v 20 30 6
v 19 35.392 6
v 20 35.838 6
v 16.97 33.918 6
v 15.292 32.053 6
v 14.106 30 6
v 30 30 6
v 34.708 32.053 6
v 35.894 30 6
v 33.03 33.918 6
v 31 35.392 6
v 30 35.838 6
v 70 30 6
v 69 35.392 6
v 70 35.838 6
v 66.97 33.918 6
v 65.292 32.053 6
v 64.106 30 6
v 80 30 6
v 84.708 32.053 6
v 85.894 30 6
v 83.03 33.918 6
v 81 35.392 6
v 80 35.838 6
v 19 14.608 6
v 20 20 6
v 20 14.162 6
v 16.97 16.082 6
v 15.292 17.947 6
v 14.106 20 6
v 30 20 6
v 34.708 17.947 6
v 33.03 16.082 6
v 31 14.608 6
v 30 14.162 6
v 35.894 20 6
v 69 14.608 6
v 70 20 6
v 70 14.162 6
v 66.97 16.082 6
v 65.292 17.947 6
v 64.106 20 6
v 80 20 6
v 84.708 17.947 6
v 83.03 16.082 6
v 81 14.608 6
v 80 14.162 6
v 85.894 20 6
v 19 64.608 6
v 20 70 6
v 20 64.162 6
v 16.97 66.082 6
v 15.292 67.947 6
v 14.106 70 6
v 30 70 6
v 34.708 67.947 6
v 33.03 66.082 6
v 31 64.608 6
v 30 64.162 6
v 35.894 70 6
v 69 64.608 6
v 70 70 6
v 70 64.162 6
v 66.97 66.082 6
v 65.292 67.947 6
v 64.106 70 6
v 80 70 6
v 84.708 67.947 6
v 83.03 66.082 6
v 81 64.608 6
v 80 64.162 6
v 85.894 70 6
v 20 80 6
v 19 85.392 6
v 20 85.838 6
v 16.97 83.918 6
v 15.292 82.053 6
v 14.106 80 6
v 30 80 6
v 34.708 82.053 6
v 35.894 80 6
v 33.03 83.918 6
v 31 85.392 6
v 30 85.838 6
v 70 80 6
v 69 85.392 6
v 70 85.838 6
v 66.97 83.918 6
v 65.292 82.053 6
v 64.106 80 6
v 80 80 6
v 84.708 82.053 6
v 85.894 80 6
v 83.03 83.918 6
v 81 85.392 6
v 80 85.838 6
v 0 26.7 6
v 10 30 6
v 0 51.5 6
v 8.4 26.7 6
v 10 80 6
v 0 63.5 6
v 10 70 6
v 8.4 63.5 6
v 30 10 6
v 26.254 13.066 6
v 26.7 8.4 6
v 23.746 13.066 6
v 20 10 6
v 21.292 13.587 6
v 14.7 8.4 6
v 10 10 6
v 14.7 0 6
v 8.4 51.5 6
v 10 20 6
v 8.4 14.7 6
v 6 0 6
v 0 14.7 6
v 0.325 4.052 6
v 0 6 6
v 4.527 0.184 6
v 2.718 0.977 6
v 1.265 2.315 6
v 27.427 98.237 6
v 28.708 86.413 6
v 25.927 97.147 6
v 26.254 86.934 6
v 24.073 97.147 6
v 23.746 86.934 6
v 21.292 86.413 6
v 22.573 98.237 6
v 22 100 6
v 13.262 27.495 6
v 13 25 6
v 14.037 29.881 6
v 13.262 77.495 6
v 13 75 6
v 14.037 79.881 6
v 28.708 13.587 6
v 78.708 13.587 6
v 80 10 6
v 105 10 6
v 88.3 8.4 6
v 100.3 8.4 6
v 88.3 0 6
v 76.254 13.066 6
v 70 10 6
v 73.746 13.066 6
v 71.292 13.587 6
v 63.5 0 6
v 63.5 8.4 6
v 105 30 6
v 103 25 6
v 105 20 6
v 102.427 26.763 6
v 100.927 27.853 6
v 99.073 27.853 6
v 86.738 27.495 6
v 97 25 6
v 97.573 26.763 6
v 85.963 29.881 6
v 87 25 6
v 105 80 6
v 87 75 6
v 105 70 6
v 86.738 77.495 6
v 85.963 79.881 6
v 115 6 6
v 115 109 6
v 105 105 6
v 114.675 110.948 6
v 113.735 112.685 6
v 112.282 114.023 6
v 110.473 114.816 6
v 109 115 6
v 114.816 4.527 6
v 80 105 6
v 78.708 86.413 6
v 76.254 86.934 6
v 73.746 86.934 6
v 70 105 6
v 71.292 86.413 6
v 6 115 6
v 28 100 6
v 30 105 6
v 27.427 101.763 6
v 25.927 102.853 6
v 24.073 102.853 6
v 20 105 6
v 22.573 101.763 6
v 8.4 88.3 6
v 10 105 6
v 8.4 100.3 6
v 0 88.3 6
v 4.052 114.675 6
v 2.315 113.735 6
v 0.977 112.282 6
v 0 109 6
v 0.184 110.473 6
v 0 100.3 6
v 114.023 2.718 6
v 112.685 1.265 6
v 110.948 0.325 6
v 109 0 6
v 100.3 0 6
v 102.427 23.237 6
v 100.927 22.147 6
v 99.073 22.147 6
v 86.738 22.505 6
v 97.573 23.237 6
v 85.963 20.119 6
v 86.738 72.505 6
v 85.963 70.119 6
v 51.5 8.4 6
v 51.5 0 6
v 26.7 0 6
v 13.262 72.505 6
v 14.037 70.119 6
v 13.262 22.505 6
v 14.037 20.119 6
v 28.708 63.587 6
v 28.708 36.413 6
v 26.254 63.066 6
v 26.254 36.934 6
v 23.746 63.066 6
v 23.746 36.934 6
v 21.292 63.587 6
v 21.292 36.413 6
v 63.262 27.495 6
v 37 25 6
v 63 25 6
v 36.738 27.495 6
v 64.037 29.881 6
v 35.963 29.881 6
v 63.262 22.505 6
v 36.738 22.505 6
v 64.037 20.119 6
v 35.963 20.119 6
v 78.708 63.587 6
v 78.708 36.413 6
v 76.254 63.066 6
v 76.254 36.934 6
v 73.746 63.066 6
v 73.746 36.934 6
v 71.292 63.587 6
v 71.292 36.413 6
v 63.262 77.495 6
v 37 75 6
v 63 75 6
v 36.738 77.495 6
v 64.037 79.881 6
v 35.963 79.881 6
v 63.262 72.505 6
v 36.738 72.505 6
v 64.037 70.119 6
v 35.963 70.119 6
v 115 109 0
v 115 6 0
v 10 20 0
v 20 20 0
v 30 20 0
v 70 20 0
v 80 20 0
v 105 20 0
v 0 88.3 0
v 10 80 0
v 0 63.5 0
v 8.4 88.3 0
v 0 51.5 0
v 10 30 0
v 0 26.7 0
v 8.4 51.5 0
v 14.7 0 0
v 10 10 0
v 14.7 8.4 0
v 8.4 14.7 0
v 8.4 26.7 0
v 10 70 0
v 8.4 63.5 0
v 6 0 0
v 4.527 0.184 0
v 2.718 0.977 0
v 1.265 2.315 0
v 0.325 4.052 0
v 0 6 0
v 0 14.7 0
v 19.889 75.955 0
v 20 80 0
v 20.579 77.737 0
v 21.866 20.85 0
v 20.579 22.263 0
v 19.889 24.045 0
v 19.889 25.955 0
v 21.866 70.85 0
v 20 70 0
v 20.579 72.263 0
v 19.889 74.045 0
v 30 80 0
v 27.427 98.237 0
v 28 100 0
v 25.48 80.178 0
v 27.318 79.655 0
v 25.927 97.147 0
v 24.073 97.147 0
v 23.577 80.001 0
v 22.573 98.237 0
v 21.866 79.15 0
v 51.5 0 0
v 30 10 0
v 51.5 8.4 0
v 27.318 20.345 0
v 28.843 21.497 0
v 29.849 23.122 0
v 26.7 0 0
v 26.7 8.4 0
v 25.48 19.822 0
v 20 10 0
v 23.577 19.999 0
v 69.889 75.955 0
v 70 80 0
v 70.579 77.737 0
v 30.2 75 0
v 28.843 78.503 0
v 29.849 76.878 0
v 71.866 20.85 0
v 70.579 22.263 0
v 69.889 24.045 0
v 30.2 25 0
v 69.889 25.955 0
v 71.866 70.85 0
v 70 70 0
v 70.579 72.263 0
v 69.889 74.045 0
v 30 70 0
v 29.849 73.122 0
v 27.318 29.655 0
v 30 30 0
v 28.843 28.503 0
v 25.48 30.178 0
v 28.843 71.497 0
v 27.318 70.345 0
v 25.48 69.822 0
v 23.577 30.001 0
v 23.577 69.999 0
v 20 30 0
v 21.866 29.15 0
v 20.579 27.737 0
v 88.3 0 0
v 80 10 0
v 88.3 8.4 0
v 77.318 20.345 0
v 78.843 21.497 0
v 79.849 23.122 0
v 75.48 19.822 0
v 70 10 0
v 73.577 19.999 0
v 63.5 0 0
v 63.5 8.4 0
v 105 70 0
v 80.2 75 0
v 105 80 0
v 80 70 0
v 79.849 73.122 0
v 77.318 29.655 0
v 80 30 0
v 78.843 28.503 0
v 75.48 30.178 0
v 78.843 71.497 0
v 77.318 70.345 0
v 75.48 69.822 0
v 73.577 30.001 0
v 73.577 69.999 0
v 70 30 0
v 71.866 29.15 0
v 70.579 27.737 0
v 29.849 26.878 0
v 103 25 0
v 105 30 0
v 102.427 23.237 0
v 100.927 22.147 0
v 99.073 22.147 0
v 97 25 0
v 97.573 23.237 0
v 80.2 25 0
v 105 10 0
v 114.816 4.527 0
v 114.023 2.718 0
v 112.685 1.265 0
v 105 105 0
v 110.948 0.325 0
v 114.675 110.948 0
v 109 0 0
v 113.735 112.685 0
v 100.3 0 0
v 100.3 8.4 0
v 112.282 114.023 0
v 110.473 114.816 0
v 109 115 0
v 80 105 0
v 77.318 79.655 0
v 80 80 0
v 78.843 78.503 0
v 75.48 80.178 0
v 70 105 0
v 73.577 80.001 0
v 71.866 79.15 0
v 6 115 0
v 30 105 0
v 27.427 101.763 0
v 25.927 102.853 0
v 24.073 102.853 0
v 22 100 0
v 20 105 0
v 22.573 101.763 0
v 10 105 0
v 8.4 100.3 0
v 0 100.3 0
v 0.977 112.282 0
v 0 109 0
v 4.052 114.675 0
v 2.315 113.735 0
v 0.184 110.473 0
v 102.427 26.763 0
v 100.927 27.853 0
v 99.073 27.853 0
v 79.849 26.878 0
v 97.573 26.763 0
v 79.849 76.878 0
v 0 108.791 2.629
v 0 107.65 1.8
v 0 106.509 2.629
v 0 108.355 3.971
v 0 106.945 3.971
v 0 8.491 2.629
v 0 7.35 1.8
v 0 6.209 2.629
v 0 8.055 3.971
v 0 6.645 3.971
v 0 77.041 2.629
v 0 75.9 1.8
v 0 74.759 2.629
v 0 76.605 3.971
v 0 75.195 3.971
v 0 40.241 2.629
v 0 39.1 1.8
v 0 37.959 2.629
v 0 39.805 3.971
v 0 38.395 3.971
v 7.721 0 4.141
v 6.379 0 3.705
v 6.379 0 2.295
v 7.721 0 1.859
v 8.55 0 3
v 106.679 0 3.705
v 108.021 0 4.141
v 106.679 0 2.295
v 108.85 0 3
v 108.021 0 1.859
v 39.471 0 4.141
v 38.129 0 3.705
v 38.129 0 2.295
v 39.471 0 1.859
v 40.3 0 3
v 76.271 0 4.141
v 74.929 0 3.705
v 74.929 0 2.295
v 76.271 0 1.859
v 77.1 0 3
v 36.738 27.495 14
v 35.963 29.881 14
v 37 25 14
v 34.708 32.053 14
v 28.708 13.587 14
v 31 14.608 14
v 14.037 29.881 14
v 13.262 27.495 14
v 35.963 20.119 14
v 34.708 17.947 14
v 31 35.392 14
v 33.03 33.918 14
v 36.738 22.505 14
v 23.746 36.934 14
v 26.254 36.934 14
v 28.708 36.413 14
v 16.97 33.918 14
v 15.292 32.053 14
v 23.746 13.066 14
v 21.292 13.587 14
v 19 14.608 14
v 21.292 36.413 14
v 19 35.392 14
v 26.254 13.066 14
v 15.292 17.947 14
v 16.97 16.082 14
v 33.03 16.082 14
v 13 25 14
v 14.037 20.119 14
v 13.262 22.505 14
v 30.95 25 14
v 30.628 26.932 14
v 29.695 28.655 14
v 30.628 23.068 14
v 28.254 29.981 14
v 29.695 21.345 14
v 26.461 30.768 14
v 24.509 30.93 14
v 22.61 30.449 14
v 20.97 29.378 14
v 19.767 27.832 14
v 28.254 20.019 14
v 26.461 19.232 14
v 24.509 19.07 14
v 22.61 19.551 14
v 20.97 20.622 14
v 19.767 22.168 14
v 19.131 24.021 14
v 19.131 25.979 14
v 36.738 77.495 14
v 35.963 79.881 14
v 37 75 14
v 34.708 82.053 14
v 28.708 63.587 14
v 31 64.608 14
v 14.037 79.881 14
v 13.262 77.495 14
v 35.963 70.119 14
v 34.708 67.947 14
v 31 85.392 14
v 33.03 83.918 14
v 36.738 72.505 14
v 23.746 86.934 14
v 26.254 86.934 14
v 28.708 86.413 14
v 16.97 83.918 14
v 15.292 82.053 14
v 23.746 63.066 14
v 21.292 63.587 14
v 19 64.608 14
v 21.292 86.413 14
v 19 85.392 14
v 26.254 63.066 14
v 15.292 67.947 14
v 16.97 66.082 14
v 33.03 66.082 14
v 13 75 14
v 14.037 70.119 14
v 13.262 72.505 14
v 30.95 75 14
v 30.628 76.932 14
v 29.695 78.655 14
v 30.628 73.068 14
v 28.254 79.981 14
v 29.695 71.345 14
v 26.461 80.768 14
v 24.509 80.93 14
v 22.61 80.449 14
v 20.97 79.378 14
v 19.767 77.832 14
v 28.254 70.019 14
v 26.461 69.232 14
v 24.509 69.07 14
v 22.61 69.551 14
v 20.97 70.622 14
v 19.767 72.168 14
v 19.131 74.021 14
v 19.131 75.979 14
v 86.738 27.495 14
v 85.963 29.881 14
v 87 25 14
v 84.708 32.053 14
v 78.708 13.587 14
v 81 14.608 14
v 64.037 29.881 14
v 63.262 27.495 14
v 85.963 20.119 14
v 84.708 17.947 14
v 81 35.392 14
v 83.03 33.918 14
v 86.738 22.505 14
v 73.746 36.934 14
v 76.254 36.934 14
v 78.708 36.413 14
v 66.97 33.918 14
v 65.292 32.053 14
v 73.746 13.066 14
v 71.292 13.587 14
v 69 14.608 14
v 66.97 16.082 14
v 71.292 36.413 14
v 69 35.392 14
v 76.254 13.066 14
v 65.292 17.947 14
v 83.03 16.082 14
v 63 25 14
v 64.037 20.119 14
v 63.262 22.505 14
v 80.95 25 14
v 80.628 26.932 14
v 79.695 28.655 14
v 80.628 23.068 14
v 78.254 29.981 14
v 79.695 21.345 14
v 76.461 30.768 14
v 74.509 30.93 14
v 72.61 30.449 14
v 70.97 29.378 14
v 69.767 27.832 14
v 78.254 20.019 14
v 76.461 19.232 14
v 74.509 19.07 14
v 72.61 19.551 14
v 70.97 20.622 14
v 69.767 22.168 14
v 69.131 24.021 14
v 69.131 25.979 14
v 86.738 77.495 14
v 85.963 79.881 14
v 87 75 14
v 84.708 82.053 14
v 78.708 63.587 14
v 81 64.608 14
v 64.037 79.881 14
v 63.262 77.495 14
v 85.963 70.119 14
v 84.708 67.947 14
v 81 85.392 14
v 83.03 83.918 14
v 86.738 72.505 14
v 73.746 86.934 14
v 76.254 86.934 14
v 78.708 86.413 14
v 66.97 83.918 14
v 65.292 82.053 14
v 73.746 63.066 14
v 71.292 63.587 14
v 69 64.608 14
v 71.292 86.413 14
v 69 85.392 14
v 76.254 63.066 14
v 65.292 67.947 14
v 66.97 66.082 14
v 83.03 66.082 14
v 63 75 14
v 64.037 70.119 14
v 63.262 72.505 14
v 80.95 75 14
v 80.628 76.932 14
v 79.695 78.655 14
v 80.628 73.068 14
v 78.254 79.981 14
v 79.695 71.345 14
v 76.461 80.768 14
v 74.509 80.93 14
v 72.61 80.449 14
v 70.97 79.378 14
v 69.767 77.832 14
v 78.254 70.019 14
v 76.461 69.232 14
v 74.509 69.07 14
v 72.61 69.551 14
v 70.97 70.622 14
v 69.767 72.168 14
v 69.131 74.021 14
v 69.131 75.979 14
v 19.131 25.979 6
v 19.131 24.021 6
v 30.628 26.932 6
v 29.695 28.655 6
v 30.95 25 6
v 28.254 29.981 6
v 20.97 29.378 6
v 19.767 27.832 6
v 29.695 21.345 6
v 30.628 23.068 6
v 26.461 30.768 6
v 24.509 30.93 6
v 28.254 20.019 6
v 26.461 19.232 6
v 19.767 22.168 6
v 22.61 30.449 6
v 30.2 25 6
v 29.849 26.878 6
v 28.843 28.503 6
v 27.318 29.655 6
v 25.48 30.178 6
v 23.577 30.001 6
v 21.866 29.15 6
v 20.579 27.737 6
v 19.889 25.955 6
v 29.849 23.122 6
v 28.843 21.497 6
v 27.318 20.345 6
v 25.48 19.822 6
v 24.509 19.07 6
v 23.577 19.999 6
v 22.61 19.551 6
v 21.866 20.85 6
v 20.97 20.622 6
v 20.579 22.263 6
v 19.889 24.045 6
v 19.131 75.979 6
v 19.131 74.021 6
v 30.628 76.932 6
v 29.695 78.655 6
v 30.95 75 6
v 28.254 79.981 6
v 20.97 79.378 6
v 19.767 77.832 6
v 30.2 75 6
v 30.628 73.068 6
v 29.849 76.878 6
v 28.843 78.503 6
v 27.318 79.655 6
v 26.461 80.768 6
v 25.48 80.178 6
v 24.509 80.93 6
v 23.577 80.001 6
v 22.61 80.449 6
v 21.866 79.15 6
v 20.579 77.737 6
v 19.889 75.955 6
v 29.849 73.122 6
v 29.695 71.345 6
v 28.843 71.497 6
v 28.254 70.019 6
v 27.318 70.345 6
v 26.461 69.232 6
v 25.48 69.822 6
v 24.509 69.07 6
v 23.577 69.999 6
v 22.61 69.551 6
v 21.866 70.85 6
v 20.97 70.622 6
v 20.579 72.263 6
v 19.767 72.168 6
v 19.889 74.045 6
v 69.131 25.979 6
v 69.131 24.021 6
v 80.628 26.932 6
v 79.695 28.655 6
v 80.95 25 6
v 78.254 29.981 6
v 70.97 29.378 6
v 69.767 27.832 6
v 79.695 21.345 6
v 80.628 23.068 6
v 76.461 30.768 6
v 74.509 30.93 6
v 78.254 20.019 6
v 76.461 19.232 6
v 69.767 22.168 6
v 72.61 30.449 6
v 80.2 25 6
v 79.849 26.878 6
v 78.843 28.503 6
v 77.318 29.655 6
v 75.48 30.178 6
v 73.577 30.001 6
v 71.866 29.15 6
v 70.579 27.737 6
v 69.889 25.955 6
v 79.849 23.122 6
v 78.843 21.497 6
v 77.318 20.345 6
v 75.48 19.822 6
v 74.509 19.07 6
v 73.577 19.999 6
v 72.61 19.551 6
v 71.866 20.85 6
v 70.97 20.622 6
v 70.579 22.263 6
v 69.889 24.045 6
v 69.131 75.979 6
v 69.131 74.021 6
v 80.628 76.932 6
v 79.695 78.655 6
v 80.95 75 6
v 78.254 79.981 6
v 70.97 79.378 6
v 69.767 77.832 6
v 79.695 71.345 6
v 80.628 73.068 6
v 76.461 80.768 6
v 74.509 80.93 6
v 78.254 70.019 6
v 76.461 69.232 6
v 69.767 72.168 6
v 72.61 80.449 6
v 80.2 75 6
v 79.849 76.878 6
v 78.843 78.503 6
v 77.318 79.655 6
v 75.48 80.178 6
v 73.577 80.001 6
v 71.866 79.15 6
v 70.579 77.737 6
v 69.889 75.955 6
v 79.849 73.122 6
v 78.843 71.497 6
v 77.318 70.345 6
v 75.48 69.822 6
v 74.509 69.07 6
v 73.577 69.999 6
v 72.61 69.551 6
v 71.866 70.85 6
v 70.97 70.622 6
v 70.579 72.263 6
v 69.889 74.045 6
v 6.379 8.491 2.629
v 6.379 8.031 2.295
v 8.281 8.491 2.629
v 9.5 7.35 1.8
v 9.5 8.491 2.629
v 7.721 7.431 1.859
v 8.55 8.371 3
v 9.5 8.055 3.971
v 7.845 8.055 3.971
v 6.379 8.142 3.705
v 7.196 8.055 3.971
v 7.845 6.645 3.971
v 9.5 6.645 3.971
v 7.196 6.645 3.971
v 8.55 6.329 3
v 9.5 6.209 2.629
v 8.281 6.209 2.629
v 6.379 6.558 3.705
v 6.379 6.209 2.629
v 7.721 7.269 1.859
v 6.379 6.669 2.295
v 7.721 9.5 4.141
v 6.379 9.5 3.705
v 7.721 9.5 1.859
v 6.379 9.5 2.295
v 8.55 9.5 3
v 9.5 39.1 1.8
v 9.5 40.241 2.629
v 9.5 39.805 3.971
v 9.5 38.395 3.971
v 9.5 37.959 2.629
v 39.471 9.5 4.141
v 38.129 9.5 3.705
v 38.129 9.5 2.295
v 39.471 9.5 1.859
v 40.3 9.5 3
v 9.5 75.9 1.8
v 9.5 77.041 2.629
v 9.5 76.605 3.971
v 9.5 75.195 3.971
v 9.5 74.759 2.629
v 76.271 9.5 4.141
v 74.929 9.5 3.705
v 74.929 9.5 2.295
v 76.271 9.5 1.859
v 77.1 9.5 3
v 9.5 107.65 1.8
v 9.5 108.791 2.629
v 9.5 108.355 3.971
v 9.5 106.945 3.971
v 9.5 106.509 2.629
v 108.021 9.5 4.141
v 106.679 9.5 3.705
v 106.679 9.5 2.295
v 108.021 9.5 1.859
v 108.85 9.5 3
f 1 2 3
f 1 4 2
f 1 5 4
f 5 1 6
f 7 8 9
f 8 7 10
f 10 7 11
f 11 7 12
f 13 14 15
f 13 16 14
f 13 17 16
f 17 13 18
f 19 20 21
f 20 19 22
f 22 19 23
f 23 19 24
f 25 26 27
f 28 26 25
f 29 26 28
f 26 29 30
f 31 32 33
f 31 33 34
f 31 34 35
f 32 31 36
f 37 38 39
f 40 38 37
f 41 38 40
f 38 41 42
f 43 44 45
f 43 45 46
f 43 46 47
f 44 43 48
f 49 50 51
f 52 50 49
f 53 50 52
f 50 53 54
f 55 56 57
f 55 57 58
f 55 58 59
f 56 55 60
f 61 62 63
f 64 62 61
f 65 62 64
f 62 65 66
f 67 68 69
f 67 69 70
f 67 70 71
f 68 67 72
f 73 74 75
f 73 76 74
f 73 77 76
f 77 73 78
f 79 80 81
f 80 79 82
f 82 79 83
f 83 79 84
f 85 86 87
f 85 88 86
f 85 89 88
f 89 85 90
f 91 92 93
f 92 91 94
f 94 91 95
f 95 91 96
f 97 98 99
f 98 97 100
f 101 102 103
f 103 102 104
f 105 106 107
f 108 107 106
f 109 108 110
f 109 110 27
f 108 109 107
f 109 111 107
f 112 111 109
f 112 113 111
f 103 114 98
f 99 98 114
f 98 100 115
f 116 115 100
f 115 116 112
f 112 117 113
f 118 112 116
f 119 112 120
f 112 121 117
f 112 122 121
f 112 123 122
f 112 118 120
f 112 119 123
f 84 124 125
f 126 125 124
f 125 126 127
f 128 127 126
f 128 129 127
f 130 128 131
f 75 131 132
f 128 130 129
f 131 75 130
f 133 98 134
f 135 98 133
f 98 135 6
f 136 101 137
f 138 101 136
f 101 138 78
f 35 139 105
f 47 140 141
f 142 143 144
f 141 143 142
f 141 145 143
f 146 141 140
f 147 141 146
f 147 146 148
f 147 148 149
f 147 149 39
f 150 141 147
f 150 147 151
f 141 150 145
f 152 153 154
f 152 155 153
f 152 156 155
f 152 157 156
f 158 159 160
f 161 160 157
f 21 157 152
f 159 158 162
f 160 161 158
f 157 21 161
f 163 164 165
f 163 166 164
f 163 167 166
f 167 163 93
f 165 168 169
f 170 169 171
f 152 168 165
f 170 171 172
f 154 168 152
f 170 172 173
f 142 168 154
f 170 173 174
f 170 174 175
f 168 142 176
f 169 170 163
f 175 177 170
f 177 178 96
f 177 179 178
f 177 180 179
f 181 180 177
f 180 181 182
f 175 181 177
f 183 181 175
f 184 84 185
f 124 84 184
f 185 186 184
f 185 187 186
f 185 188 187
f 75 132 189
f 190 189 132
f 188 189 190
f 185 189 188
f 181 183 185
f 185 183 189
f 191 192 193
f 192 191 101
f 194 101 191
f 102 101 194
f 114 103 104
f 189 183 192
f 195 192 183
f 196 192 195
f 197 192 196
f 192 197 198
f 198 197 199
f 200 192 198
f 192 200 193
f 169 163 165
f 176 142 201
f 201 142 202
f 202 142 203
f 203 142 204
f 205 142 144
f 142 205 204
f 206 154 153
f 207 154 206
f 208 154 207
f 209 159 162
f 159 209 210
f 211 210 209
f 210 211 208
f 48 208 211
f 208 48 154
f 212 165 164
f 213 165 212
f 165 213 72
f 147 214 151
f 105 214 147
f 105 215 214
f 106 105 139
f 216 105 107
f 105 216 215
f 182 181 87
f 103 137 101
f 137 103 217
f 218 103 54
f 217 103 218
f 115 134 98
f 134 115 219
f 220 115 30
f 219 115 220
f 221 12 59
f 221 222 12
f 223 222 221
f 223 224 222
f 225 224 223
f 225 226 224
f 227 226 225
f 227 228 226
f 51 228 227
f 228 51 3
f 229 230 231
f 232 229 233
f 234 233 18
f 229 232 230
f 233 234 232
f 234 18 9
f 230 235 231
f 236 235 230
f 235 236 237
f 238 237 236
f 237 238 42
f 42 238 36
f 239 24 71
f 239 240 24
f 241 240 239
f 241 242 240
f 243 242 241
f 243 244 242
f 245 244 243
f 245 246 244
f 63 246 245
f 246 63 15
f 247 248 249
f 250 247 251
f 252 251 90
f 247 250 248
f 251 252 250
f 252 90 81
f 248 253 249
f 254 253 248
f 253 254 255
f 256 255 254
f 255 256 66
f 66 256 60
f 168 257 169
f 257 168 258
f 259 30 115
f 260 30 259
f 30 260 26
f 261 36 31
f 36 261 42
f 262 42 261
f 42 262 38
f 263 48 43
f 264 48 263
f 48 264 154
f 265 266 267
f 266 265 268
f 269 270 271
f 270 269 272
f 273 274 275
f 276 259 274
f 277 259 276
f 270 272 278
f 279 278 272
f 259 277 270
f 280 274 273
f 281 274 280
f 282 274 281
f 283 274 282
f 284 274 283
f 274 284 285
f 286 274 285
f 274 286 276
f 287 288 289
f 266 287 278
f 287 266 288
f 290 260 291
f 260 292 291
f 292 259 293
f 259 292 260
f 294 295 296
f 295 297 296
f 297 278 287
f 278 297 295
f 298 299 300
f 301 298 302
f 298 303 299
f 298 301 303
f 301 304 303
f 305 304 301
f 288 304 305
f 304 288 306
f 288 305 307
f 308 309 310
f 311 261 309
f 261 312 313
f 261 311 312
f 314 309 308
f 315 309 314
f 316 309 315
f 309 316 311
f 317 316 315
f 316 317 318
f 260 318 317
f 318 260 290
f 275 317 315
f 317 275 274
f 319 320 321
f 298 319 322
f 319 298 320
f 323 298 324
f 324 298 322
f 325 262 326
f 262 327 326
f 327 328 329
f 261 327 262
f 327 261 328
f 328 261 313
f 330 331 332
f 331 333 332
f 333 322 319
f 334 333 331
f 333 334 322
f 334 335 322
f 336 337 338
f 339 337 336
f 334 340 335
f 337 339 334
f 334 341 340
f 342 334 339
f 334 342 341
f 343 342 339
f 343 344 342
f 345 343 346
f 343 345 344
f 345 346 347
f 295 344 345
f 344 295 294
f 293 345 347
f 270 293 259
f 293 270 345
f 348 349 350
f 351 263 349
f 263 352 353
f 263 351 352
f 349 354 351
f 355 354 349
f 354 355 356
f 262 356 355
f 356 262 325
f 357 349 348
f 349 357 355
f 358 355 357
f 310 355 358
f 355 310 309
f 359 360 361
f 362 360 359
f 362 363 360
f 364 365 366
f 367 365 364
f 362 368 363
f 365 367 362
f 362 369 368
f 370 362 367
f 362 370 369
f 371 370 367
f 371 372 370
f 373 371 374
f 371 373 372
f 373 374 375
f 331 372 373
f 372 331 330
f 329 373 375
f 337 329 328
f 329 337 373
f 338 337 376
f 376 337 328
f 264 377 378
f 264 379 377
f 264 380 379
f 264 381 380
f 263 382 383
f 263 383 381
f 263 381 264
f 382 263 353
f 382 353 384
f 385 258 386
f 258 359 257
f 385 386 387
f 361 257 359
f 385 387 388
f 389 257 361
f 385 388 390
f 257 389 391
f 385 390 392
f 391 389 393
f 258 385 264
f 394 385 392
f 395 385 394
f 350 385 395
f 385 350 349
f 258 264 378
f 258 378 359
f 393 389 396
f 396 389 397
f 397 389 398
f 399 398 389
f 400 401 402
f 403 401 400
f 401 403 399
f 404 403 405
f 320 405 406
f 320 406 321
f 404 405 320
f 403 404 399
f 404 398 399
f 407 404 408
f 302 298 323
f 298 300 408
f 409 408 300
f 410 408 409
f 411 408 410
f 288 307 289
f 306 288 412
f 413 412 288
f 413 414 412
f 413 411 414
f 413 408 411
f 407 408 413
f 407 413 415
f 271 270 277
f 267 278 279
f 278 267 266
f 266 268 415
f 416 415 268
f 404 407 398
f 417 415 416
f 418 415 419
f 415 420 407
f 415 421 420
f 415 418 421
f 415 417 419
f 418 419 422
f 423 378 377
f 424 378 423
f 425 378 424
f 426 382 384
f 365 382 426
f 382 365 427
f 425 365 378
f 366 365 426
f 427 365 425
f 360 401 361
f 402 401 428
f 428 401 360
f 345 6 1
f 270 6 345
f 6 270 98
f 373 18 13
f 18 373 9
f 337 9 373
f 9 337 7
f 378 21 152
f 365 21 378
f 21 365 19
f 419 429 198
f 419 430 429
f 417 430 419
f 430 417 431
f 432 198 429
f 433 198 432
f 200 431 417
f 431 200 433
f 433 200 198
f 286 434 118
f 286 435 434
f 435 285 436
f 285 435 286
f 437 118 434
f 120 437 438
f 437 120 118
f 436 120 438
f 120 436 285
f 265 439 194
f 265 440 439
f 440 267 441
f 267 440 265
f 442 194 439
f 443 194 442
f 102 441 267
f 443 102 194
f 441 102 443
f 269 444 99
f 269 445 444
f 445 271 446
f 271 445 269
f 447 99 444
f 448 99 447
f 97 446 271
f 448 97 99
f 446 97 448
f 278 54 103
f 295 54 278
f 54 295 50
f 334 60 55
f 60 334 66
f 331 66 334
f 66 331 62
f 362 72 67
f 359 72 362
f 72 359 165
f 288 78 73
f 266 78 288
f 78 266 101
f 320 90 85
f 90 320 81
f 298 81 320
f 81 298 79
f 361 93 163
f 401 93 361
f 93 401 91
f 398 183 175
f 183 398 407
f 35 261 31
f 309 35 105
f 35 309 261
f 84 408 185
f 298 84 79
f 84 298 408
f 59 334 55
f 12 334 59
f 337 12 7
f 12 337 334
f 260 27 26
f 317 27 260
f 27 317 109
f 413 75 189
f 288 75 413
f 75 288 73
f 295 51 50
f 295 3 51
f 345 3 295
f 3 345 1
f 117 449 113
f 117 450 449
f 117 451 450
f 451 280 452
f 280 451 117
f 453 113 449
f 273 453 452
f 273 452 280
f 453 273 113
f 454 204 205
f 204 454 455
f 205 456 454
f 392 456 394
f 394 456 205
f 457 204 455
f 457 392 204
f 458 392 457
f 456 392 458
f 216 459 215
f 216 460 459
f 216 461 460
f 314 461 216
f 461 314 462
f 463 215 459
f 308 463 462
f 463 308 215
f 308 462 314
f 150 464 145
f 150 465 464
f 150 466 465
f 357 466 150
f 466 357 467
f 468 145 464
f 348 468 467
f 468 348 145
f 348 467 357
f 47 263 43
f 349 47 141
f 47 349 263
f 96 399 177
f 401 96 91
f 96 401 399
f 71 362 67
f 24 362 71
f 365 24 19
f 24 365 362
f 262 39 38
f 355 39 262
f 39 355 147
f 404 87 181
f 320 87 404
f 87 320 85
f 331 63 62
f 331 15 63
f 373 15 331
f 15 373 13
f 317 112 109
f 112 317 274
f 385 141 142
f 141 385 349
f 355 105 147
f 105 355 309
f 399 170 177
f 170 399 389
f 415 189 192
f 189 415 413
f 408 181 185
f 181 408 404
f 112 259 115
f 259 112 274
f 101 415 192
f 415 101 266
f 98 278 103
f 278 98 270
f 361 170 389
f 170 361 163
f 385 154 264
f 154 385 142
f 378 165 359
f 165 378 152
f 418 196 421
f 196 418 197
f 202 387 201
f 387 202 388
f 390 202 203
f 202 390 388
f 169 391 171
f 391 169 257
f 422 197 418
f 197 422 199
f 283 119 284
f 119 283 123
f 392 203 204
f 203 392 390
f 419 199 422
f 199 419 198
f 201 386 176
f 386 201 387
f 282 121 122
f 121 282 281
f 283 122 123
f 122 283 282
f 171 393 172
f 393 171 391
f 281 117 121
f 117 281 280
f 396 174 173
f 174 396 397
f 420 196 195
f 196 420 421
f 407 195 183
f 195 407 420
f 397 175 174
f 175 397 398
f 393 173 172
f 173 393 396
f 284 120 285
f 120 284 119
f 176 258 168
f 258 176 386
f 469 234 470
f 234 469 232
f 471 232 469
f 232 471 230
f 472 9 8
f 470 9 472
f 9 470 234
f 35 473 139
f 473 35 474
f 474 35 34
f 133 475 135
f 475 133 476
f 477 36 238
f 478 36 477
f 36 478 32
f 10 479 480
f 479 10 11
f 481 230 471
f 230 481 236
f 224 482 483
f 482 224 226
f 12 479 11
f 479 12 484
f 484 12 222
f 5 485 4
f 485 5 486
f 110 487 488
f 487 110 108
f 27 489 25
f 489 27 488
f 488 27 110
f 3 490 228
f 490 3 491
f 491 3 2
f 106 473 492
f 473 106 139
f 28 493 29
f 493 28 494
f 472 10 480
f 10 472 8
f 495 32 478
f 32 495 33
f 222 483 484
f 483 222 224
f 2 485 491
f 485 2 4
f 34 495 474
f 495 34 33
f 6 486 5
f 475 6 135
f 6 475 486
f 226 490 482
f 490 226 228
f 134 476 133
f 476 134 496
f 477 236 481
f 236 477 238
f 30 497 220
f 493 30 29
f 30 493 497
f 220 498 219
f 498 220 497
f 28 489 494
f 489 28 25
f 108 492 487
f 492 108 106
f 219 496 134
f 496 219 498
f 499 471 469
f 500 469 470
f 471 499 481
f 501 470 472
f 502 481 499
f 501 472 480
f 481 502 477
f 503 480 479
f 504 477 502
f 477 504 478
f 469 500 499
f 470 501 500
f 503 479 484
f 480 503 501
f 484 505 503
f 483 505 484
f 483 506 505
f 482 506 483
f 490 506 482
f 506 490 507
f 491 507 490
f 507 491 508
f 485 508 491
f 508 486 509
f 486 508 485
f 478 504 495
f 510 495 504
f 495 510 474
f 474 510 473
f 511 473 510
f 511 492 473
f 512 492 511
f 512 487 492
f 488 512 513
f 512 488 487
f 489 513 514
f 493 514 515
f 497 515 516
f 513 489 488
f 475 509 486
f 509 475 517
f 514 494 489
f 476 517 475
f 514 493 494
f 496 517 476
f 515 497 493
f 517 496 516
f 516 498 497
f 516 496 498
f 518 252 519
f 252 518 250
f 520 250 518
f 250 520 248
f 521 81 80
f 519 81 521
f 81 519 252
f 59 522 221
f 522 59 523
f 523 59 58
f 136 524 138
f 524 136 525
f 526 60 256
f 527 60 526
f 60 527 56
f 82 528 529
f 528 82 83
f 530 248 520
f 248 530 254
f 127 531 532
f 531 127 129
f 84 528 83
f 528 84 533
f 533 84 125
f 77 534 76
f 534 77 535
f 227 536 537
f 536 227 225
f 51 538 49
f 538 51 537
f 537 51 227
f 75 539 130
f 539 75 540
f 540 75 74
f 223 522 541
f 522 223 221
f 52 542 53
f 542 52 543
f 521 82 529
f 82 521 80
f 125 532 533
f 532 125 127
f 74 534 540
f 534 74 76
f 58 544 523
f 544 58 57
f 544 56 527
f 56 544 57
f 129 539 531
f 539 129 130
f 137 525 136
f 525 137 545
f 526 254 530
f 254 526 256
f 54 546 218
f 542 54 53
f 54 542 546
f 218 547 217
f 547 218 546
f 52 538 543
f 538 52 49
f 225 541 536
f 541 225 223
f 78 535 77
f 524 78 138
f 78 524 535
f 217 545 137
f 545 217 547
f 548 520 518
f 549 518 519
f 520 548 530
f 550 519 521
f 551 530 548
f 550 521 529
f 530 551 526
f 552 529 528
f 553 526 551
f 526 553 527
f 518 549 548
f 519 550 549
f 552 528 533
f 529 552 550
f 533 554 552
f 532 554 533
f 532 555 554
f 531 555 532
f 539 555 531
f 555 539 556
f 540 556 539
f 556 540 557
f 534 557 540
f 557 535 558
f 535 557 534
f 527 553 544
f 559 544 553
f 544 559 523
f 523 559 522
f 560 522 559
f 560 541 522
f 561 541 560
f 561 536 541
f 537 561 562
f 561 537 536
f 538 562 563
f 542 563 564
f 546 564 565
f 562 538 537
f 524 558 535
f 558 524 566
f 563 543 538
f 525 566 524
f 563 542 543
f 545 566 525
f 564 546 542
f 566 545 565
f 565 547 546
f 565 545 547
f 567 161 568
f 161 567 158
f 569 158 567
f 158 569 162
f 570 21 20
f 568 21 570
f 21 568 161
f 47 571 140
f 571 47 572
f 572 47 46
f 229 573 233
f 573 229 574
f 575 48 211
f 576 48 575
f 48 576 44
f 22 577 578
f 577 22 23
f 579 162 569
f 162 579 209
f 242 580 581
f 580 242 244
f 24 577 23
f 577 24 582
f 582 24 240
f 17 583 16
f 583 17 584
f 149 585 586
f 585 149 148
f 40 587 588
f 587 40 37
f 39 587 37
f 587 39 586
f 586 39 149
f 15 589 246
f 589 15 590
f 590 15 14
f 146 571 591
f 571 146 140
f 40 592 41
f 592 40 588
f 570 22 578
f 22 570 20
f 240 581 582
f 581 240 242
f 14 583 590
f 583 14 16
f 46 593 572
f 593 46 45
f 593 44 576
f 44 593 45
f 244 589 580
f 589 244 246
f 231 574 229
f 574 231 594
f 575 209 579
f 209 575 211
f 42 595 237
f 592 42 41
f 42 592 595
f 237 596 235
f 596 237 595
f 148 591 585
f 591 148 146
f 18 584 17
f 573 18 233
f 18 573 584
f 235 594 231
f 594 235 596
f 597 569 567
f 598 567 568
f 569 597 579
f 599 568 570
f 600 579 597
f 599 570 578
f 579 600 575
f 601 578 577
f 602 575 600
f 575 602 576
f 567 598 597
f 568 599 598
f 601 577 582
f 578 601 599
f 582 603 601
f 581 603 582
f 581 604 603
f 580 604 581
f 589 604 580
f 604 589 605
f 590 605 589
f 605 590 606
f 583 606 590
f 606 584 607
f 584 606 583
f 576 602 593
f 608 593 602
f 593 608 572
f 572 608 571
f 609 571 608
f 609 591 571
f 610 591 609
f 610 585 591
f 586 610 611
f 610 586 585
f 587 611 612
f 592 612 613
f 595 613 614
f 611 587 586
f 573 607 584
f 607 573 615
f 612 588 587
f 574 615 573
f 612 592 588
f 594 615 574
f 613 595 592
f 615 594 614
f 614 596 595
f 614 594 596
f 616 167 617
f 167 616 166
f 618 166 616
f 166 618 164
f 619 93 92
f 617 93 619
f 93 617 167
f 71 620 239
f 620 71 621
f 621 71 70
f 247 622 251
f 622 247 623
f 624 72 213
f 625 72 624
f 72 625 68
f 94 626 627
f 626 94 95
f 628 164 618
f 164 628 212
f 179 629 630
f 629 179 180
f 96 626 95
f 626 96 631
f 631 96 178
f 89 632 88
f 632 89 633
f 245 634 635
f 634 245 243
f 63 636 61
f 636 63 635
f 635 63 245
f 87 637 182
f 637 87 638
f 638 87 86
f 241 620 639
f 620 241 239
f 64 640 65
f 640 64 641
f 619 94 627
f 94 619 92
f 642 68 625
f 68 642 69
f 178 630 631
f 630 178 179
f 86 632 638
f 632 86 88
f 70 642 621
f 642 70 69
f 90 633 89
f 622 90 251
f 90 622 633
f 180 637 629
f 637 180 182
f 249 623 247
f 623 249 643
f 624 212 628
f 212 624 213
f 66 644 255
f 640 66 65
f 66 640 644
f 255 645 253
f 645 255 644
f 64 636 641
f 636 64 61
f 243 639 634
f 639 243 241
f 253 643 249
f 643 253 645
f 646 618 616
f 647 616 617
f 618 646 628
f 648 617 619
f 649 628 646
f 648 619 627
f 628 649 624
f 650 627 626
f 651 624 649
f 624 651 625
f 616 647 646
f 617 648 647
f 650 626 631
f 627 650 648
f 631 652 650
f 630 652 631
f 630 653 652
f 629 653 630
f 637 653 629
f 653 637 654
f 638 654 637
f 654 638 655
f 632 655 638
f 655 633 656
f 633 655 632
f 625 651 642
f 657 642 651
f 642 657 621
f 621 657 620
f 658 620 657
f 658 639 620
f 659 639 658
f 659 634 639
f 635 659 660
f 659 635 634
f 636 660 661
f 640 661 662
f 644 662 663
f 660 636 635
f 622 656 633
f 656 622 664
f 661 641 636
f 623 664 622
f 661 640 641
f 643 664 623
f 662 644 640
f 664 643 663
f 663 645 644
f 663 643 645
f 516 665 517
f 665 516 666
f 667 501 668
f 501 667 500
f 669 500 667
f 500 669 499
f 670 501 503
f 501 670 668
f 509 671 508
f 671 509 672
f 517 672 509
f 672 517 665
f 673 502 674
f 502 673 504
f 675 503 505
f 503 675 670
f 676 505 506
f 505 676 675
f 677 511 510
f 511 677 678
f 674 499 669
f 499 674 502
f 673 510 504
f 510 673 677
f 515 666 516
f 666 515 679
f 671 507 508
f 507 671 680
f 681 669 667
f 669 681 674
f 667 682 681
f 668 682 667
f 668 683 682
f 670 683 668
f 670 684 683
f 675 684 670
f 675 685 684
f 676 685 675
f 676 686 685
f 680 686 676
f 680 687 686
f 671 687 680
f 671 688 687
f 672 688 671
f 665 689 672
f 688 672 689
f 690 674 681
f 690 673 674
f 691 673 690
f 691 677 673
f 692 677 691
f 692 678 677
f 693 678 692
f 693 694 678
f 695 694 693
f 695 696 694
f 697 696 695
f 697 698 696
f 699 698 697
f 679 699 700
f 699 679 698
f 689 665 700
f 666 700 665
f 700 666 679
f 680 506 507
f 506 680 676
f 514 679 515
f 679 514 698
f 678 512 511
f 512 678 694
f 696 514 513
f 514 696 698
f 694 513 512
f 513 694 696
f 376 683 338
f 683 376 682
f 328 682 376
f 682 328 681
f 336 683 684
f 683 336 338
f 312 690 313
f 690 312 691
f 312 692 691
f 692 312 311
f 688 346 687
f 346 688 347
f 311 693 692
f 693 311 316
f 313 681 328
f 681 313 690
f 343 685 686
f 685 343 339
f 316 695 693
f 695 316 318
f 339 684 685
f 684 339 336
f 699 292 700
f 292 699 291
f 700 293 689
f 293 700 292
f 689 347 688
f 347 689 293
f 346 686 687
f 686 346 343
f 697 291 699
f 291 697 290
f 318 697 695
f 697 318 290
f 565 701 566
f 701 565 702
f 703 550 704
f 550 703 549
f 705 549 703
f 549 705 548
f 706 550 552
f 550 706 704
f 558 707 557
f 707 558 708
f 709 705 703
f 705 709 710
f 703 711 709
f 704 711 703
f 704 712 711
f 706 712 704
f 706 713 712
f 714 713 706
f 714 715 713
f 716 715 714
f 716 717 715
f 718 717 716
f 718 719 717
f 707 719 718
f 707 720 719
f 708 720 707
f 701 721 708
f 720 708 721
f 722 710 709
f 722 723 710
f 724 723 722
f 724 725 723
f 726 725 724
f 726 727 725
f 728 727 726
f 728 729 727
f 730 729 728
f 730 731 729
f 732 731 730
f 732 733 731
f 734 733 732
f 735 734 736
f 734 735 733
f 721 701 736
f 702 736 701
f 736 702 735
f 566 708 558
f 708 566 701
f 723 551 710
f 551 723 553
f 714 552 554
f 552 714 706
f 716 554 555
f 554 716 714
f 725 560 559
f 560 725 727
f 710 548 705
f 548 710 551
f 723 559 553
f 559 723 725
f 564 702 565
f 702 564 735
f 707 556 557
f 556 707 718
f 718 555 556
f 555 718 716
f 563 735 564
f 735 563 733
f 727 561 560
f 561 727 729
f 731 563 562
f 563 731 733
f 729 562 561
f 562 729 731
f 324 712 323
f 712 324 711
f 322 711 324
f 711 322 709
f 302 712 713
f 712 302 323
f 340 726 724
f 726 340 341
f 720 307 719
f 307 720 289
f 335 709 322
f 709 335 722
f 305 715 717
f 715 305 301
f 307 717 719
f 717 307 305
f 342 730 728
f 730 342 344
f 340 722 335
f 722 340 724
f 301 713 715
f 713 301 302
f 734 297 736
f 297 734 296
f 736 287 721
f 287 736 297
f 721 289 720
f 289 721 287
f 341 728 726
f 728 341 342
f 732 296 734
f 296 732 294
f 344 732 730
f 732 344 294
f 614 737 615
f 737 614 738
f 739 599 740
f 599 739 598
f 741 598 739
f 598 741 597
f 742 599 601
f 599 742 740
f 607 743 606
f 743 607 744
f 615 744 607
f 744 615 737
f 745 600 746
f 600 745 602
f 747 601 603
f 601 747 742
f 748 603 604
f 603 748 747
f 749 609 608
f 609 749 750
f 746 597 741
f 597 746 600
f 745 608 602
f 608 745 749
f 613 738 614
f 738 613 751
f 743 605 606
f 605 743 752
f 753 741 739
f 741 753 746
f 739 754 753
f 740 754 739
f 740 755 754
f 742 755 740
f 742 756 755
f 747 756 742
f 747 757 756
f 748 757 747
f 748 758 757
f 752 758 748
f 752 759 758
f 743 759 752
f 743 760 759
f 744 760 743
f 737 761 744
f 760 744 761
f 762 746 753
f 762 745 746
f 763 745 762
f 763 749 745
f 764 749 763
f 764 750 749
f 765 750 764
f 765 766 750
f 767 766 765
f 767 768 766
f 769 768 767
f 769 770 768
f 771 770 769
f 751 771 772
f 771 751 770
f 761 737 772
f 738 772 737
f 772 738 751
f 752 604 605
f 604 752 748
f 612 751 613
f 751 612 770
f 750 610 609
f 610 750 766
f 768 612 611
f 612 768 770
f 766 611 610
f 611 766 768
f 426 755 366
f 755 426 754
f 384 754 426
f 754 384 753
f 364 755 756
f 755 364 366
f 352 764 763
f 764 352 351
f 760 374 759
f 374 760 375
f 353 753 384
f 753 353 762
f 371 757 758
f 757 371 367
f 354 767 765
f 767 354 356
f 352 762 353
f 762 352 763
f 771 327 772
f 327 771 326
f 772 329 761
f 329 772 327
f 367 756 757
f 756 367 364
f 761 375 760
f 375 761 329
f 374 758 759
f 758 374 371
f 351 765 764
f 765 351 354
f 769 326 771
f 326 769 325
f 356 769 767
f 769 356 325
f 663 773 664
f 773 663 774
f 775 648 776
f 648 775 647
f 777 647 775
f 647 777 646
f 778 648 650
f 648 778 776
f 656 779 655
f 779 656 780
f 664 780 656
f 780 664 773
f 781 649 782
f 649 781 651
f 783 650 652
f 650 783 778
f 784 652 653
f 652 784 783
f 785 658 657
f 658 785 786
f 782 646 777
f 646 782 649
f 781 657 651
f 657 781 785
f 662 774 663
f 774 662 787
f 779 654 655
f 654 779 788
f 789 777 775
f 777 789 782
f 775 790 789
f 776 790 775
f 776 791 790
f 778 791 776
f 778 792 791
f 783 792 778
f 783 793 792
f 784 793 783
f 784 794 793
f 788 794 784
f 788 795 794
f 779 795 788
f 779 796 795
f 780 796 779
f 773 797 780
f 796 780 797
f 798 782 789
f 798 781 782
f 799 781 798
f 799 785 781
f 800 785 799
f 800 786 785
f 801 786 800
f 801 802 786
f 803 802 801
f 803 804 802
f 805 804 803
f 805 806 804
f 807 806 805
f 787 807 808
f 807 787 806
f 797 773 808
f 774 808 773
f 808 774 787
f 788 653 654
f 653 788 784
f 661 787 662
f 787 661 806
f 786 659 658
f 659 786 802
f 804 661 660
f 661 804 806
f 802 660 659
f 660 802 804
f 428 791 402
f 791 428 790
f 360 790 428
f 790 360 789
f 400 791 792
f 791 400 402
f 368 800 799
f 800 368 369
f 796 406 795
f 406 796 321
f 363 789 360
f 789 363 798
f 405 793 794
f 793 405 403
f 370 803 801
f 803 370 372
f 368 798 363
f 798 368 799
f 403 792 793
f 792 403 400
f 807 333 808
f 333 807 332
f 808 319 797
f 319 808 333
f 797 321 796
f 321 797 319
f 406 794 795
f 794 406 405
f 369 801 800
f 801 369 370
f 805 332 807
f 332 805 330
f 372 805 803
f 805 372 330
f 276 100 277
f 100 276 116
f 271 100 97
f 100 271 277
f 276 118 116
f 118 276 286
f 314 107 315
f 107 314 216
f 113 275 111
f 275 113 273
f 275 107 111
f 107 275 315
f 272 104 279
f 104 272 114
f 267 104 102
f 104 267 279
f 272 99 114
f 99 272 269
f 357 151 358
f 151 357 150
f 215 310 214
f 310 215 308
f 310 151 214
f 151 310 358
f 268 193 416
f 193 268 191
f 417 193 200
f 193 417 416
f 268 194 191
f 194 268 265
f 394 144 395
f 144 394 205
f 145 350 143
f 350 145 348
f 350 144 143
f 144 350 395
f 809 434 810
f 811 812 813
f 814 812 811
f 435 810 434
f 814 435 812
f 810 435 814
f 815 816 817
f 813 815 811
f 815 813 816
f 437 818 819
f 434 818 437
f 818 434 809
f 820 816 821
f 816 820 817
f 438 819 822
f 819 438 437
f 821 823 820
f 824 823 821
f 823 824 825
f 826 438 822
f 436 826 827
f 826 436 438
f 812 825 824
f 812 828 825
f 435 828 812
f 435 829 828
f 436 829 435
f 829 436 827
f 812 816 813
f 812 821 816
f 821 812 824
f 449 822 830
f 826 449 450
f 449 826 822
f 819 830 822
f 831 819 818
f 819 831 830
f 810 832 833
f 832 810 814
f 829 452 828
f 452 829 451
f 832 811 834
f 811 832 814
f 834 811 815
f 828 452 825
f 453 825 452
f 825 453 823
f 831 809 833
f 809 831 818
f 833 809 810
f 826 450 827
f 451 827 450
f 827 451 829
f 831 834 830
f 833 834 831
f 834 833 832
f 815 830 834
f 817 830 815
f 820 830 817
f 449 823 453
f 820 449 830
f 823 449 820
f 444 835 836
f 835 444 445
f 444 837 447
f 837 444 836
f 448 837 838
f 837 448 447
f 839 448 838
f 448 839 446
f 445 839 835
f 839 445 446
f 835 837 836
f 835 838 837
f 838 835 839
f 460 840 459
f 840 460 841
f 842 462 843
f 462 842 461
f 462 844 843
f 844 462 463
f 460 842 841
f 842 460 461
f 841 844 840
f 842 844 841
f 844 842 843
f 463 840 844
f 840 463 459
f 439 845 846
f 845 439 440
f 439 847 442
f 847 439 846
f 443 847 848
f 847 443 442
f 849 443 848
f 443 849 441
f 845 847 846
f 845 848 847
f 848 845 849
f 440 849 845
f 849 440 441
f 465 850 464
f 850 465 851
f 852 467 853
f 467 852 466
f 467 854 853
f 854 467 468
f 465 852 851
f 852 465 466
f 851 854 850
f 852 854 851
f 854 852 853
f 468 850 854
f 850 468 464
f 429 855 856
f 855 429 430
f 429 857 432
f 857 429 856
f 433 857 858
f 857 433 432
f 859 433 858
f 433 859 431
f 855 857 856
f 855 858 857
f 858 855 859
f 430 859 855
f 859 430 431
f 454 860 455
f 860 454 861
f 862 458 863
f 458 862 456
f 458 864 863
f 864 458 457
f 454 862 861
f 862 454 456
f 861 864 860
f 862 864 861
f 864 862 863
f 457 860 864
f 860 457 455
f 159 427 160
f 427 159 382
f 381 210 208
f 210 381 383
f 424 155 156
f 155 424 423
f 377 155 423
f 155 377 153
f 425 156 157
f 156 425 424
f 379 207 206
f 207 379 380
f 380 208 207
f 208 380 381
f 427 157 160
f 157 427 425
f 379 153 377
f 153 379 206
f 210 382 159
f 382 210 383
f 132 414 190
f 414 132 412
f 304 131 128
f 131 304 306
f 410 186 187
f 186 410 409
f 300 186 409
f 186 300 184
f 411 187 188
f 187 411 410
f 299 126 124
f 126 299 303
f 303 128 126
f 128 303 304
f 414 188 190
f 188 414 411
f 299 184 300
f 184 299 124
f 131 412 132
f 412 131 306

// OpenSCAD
// file: frame.scad
// ============================================================================
//  RIBBED FRAME HELPER — replaces a solid plate with border + grid ribs.
//  Same stiffness where it matters (bosses clamped flat), ~half the plastic.
// ============================================================================

rib_w    = 10;   // [mm] grid rib width
border_w = 10;   // [mm] perimeter border width

// Plan-view rounded rectangle prism — trims vertical edges to radius r.
// Inset polygon + offset(r) keeps the flat edges on x0/x1/y0/y1.
module rounded_outline(x0, y0, x1, y1, h, r = corner_r) {
    translate([0, 0, -0.05])
        linear_extrude(h + 0.1)
            offset(r = r)
                polygon([[x0 + r, y0 + r],
                         [x1 - r, y0 + r],
                         [x1 - r, y1 - r],
                         [x0 + r, y1 - r]]);
}

// Rounded box helper for external edges. Keep radii small to preserve fits.
module rounded_box(size, r = edge_break) {
    // 2D rounded footprint extruded to preserve exact outer dimensions.
    translate([0,0,-size[2]/2]) linear_extrude(size[2])
        offset(r=r) square([size[0]-2*r,size[1]-2*r],center=true);
}

// x0,y0,x1,y1 = plate extent; xs/ys = station coordinates the ribs run through
module rib_plate(x0, y0, x1, y1, xs, ys) {
    intersection() {
        union() {
        // border ring
        translate([(x0+x1)/2, y0+border_w/2, base_t/2]) rounded_box([x1-x0,border_w,base_t]);
        translate([(x0+x1)/2, y1-border_w/2, base_t/2]) rounded_box([x1-x0,border_w,base_t]);
        translate([x0+border_w/2, (y0+y1)/2, base_t/2]) rounded_box([border_w,y1-y0,base_t]);
        translate([x1-border_w/2, (y0+y1)/2, base_t/2]) rounded_box([border_w,y1-y0,base_t]);
        // ribs through each station row/column
        for (y = ys)
            translate([(x0+x1)/2, y, base_t/2])
                rounded_box([x1-x0, rib_w, base_t]);
        for (x = xs)
            translate([x, (y0+y1)/2, base_t/2])
                rounded_box([rib_w, y1-y0, base_t]);
        }
        rounded_outline(x0, y0, x1, y1, base_t);
    }
}

module pin_post(x, y) {
    translate([x, y, base_t - pin_embed]) {
        cylinder(d = pin_d, h = pin_embed + pin_len - chamfer_h);
        translate([0, 0, pin_embed + pin_len - chamfer_h])
            cylinder(d1 = pin_d, d2 = pin_d - 2 * chamfer_d, h = chamfer_h);
    }
}

module guide_boss(x, y) {
    translate([x, y, base_t])
        cylinder(d = boss_od, h = boss_h);
}

module guide_bores(x, y) {
    translate([x, y, base_t + boss_h - bush_seat_h])
        cylinder(d = bush_hole_d, h = bush_seat_h + 0.02);
    translate([x, y, -0.01])
        cylinder(d = bit_clear_d, h = base_t + boss_h + 0.02);
}
// file: params.scad
// ============================================================================
//  SHARED PARAMETERS — pegboard jig print set
//  10mm holes on a 50mm grid, 18mm plywood, first hole 25mm from each edge.
//  Include this file in every part so dimensions stay in sync.
// ============================================================================

pitch        = 50;    // [mm] grid spacing
hole_d       = 10;    // [mm] drilled hole / bit size (reference)
edge_offset  = 25;    // [mm] first hole centre from each edge
panel_t      = 18;    // [mm] plywood thickness (fence reach below z=0)

// Locating pins — drop into drilled holes. All pin parts print PINS-UP.
pin_d      = 9.8;     // snug in a 10mm hole (9.9 tighter, 9.5 looser)
pin_len    = 10;      // engagement depth
pin_embed  = 3;       // root embedded in the base
chamfer_h  = 1.2;
chamfer_d  = 0.7;

// Drill guides — 12mm OD / 10mm ID metal bush press fit
bush_hole_d  = 11.9;  // press-fit seat (11.7 tighter, 12.1 slip+glue)
bit_clear_d  = 10.4;  // 0.2mm/side clearance
bush_seat_h  = 8;
boss_od      = 24;
boss_h       = 8;

// Base plates
base_t       = 6;
margin       = boss_od / 2 + 6;   // plate margin around stations

// Fence joint — must match between plate notches and fence tabs
notch_d      = 8.4;
notch_w      = 12;
tab_w        = 10;
tab_t        = 4.4;
tab_z0       = 0.3;
tab_in       = 8;
tab_frac     = [0.18, 0.5, 0.82];
fence_t      = 4;
fence_top    = 14;
clamp_gap    = 25;
edge_margin  = 15;
clamp_hole_d = 6;

// Edge rounding — plan-view corner radius, helps high-speed printing
corner_r     = 6;      // [mm] on plates / rib frames
corner_r_s   = 3;      // [mm] on small parts (carriage, inserts)
edge_break   = 0.8;    // [mm] small chamfer on exposed vertical-part edges

// Fence→plate screws — horizontal M3 self-tappers through the fence
// wall into the plate edge band, in the solid gaps between notches.
// Shared by plate (pilot) and fence (through) so positions always match.
screw_d       = 3;      // [mm] M3
screw_clear   = 3.4;    // through-hole Ø in the fence wall
screw_pilot   = 2.4;    // pilot hole Ø into the plate edge
screw_depth   = 9.5;    // pilot depth — stays inside the 10mm border band
screw_z       = 3;      // hole centre height (mid plate thickness)
screw_min_gap = 10;     // smallest solid edge interval that takes a screw

// Solid intervals along a fence edge = reach minus the notch pockets.
// Returns centre positions for the screw holes (same on both parts).
function screw_stations(reach, tab_pos) =
    let(
        flat   = [for (c = tab_pos, e = [-notch_w / 2, notch_w / 2]) c + e],
        bounds = concat([0], flat, [reach]),
        pairs  = [for (i = [0 : 2 : len(bounds) - 2])
                      [bounds[i], bounds[i + 1]]]
    )
    [for (p = pairs) if (p[1] - p[0] >= screw_min_gap)
        (p[0] + p[1]) / 2];
// main file
// ============================================================================
//  STARTER 2x2 PLATE — ribbed corner seed jig for Proposals 1, 2, 4, 5
//  (also serves as the Proposal 5 convertible body — pin inserts drop
//  into any bush seat)
//  Ribbed frame version: ~55% less plastic than the solid plate.
//  PRINT: flat side down, bosses up. No supports.
// ============================================================================
include <params.scad>
include <frame.scad>

seed_cols = 2;
seed_rows = 2;

span    = edge_offset + (max(seed_cols, seed_rows) - 1) * pitch; // 75
clamp_p = span + clamp_gap;                                      // 100
reach   = clamp_p + edge_margin;                                 // 115
tab_pos = [for (f = tab_frac) f * reach];
screw_pos = screw_stations(reach, tab_pos);
xs = [for (i = [0 : seed_cols - 1]) edge_offset + i * pitch];    // 25, 75
ys = xs;

module starter2_plate() {
    difference() {
        union() {
            rib_plate(0, 0, reach, reach, xs, ys);
            // pads under the clamp holes (they sit in window cells)
            translate([clamp_p - 10, edge_offset - rib_w / 2, 0])
                cube([20, rib_w, base_t]);
            translate([edge_offset - rib_w / 2, clamp_p - 10, 0])
                cube([rib_w, 20, base_t]);
            for (x = xs, y = ys) guide_boss(x, y);
        }
        for (x = xs, y = ys) guide_bores(x, y);
        translate([clamp_p, edge_offset, -0.01])
            cylinder(d = clamp_hole_d, h = base_t + 0.02);
        translate([edge_offset, clamp_p, -0.01])
            cylinder(d = clamp_hole_d, h = base_t + 0.02);
        for (c = tab_pos) {
            translate([0, c - notch_w / 2, -0.01])
                cube([notch_d, notch_w, base_t + 0.02]);
            translate([c - notch_w / 2, 0, -0.01])
                cube([notch_w, notch_d, base_t + 0.02]);
        }
        // M3 pilot holes for the fence screws — into the solid edge band
        for (sy = screw_pos) {
            translate([-0.5, sy, screw_z])
                rotate([0, 90, 0])
                    cylinder(d = screw_pilot, h = screw_depth + 0.5);
            translate([sy, -0.5, screw_z])
                rotate([-90, 0, 0])
                    cylinder(d = screw_pilot, h = screw_depth + 0.5);
        }
    }
}

starter2_plate();
